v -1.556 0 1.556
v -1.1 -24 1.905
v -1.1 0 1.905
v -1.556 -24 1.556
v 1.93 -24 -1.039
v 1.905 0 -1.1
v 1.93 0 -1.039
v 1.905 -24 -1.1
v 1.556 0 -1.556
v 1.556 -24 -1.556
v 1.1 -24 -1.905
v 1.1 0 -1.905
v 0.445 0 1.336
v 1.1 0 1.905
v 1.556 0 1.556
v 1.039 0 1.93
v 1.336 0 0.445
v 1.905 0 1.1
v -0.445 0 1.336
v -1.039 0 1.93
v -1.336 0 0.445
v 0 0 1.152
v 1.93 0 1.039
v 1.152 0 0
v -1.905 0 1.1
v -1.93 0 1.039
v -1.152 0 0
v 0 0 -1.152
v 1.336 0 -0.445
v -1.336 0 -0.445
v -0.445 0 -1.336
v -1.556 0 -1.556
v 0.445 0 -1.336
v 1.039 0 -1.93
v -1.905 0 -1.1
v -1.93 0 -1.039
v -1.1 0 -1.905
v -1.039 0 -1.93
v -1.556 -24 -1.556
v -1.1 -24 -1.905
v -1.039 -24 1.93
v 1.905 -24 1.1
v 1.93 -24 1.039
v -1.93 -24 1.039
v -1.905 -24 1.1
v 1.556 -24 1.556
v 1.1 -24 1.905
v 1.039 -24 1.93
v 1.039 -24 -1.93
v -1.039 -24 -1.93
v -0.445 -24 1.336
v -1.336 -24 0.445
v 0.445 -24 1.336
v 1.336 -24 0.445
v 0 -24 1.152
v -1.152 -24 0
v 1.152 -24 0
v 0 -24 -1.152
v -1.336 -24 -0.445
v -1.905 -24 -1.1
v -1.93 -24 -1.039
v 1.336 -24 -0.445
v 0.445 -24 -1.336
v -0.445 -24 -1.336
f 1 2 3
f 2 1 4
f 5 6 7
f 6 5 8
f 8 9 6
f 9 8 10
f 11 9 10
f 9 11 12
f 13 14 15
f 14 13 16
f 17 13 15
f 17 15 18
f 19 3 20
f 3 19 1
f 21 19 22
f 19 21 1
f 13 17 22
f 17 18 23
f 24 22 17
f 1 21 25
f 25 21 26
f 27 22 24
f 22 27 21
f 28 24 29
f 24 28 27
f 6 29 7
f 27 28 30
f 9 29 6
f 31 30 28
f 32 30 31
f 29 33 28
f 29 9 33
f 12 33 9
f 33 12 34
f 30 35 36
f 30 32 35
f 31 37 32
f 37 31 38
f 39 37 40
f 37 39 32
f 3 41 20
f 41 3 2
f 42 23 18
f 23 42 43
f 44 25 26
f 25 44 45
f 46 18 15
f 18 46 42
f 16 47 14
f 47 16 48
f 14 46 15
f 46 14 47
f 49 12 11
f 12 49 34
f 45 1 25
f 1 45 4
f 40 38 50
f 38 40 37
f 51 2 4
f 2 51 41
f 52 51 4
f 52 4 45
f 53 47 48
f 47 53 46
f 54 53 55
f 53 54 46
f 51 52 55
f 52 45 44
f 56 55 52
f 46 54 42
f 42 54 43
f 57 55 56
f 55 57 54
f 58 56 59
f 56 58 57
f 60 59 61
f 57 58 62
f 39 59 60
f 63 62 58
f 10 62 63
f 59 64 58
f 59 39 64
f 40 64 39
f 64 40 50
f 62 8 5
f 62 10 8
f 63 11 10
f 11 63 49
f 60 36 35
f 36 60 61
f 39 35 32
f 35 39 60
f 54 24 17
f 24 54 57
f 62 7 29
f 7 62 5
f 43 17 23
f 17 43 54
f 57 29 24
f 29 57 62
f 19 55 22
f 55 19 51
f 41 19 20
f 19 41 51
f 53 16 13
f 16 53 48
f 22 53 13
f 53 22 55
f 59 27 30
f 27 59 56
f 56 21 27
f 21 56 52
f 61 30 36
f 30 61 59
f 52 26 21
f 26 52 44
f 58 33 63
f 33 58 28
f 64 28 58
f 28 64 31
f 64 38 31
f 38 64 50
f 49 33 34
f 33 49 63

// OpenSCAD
// file: PELA-technic-axle.scad
/*
PELA Parametric LEGO-compatible Technic Axle

PELA Parametric Blocks - 3D Printed LEGO-compatible parametric blocks

Published at https://PELAblocks.org

By Paul Houghton
Twitter: @mobile_rat
Email: paulirotta@gmail.com
Blog: https://medium.com/@paulhoughton

Creative Commons Attribution-ShareAlike 4.0 International License
    https://creativecommons.org/licenses/by-sa/4.0/legalcode

Open source design, Powered By Futurice. Come work with the best.
    https://www.futurice.com/
*/

include <../style.scad>
include <../material.scad>
use <../PELA-block.scad>


/* [Render] */

// Show the inside structure [mm]
_cut_line = 0; // [0:0.5:5]

// Printing material (set to select calibrated knob, socket and axle hole fit)
_material = 0; // [0:PLA, 1:ABS, 2:PET, 3:Biofila Silk, 4:Pro1, 5:NGEN, 6:NGEN FLEX, 7:Bridge Nylon, 8:TPU95, 9:TPU85/NinjaFlex, 10:Polycarbonite]

// Is the printer nozzle >= 0.5mm? If so, some features are enlarged to make printing easier
_large_nozzle = true;


/* [Technic Axle] */

// Axle length [blocks]
_l = 3; // [1:1:20]

// An axle which fits loosely in a technic bearing hole [mm]
_axle_radius = 2.2; // [0.2:0.1:3.9]

// Size of the hollow inside an axle [mm]
_center_radius = 1.1; // [0.0:0.1:3.8]


/* [Technic Axle] */
_defeather = 0.001;


///////////////////////////////
// DISPLAY
///////////////////////////////

axle(material=_material, large_nozzle=_large_nozzle, cut_line=_cut_line, l=_l, axle_radius=_axle_radius, center_radius=_center_radius);
  



/////////////////////////////////////
// MODULES
/////////////////////////////////////

module axle(material, large_nozzle, cut_line=_cut_line, l, axle_radius, center_radius) {
    
    assert(material!=undef);
    assert(large_nozzle!=undef);
    assert(cut_line!=undef);
    assert(l>=0);
    assert(axle_radius>=0);
    assert(center_radius>=0);

    axle_length = block_width(l);

    difference() {
        cylinder(r=axle_radius, h=axle_length);

        union() {
            translate([0, 0, -_defeather]) {
                if (center_radius > 0 && axle_length > 0)
                    cylinder(r=center_radius, h=axle_length + 2*_defeather);
            }

            translate([-axle_radius, -axle_radius, 0]) {
                cut_space(material=material, large_nozzle=large_nozzle, l=l, w=1, cut_line=cut_line, h=l, block_height=_block_height, knob_height=_knob_height, skin=0);
            }
        }
    }
}
// file: ../style.scad
/*
PELA Parametric Block Style

Alter the baseline style of all designs. Many designs will locally override some but not all of these parameters.

Published at https://PELAblocks.org

By Paul Houghton
Twitter: @mobile_rat
Email: paulirotta@gmail.com
Blog: https://medium.com/@paulhoughton

Creative Commons Attribution-ShareAlike 4.0 International License
    https://creativecommons.org/licenses/by-sa/4.0/legalcode

Open source design, Powered By Futurice. Come work with the best.
    https://www.futurice.com/

Import this into other design files to set baseline constants:
    include <style.scad>

If the nozzle you normally use on your printer is 0.5mm or less, edit line 31 to read:
    31:     large_nozzle = false; // [true:nozzle >= 0.5mm, false:nozzle < 0.5mm]

There are many other parameters here which affect all generated PELA models. Any changes you make here affect all models unless that parameter is locally updated in a given model. Where models duplicate these settings, the local value will appear in the "Customizer" view of OpenSCAD. Think of those local overrides of these default style settings as a design decision: changing that parameter for that particular model is likely to be useful to you.

*/

include <material.scad>


/* [Block] */

// Presence of bottom connector sockets
_sockets = true;

// Presence of top connector knobs
_knobs = true;

// Place holes in the corners for mountings screws (0=>no holes, 1=>holes)
_corner_bolt_holes = false;

// Size of corner holes for M3 mountings bolts
_bolt_hole_radius = 1.6; // [0.0:0.1:3.0]

// Add interior fill for the base layer
_solid_first_layer = false;

// Add interior fill for upper layers
_solid_upper_layers = true;


/* [Knob] */

// Knob top surface strength
_knob_top_thickness = 1.0;

// Height of traditional connectors [mm] (taller gives a stronger hold)
_knob_height = 2.9; // [0:disabled, 1.8:traditional, 2.9:PELA 3D print tall]

// Size of a hole in the top of each knob. Set 0 to disable for best flexture or enable for air circulation/aesthetics/drain resin
_knob_vent_radius = 0.0; // [0.0:0.1:4]

// Ease insertion by slightly widening the socket entry
_bevel_socket = true;

// Height of a small bottom knob insert easement, flaring the bottom edges to make assembly easier
_socket_insert_bevel = 0.1;




/* [Technic] */

// Technic connector hole
//axle_hole_radius = 2.45 + axle_hole_tweak;

// Add full width through holes spaced along the length for techic connectors
_side_holes = 3; // [0:disabled, 1:short air vents, 2:short connectors, 3:full width connectors]

// Add a wrapper around side holes (disable for extra ventilation but loose lock notches)
_side_sheaths = true;

// Add short end holes spaced along the width for techic connectors
_end_holes = 2; // [0:disabled, 1:short air vents, 2:short connectors, 3:full length connectors]

// Add a wrapper around end holes (disable for extra ventilation but loose lock notches)
_end_sheaths = true;

// Add holes in the top deck to improve airflow and reduce weight
_top_vents = false;


/* [Shell] */

// Thickness of the solid top surface of the block
_top_shell = 1;


/* [Advanced Block] */

// Basic unit vertical size of each block
_block_height = 8; // [8:technic, 9.6:traditional knobs]

// Horizontal clearance space removed from the outer horizontal surface to allow two parts to be placed next to one another on a 8mm grid [mm]
_skin = 0.1; // [0:0.02:0.5]

// Height of the hole beneath each knob which facilitates click lock in low-flex materials by variable side pressure on any block above
_knob_flexture_height = 4.5;

// Width of horizontal surface strengthening slats between the bottom rings
_bottom_stiffener_width = 2.6;

// Height of horizontal surface strengthening slats (appears between the bottom rings, default is material.scad:knob_height)
_bottom_stiffener_height = _knob_height;


/* [Advanced Technic] */

// Technic connector hole inset radius
_counterbore_inset_radius = 3.1; // [0.1:0.1:4]

// Technic connector hole inset depth
_counterbore_inset_depth = 0.95; // [0.1:0.1:4]

// Contact length of axle to block (not including inset length and end snap fit flexture in peg connectors)
_peg_length = 6.5; // [0.1:0.1:16]

// Size of the cylinder wrapped around the technic holes
_bearing_sheath_thickness = 0.9; // [0.1:0.1:4]


/* [Block Aesthetics] */

// Width of a line etched in the side of multi-layer block sets (0 to disable)
_ridge_width = 0.15; // [0.1:0.05:4]

// Depth of a line etched in the side of multi-layer block sets
_ridge_depth = 0.3; // [0.1:0.05:4]


/* [Baked Print Supports] */

// Generate print-time support aid structures for models which offer this. Turn this off if you will use slicer-generated print supports, but be aware that these may make the bottom connectors difficult to post process.
_print_supports = true;

// Space between support/support.scad and the part)
_support_offset_from_part = 0.1; // [0.0:0.01:1]

// Thickness of each rotating layer in a twisting support [mm]
_support_layer_height = 2; // [0.1:0.1:8]

// Thickness of a base panel for holding supports together [mm]
_support_connection_height = 0.5; // [0.1:0.1:8]

// Length of sides of a support equilateral triangle [mm]
_support_side_length = 4; // [0.1:0.1:16]

// Per layer support rotation for strength [degrees]
_support_layer_rotation = 6; // [1:179]

// Reverse direction of support rotation periodically to constrain size [degrees] (0 to disable)
_support_max_rotation = 0; // [0:360]


/* [Hidden] */

// Basic unit horizontal size of each block
_block_width = 8; // [8:technic and traditional blocks]

// Height of the connectors commercial blocks use [mm]
_official_knob_height = 1.8; // [1.8:traditional blocks]

// Slight visual offset to work around prevent goldfeather rendering bugs in OpenSCAD (visual, not affecting final print geometry) [mm]
_defeather = 0.01;

// Roundness of bottom connector rings (Use 8 for octagonal sockets- many parts of the geomoetry must be adjusted if you change this)
_ring_fn=8;

// Roundness of bottom connector rings (Use 8 for octagonal sockets- many parts of the geomoetry must be adjusted if you change this)
_axle_hole_fn=32;

// Minimum angle to approximate a circle
$fa = 15;

// Minimum segment length to approximate a circle
$fs = 0.5;


/////////////////////////////////////
// FUNCTIONS
/////////////////////////////////////

// Horizontal size
function block_width(i=1) = i*_block_width;

// Vertical size [mm]
function block_height(h=1, block_height) = h*block_height;

// Test if this is a corner block
function is_corner(x, y, l, w) = (x==0 || x==l-1) && (y==0 || y==w-1);

// Ratio of a flat panel thickness to a regular block thickness (1/2 for PELA 8mm tall blocks, 1/3 for LEGO 9.6mm block_height blocks)
function panel_height_ratio(block_height) = block_height < 9.6 ? 1/2 : 1/3;

// Thickness of a flat panel [mm]
function panel_height(block_height) = block_height(1, block_height=_block_height)*panel_height_ratio(block_height=_block_height);

// Bottom connector additional distance from outside lock and connector rings which small flexture-fit rims protrude inwards to grab the base of knobs for asymmetric side pressure to assist with snap fit [mm]
function side_lock_thickness(material) = is_flexible(_material) ? 0.06 : 0.02;

// Horizontal width of each side of a support triangle [mm]
function support_line_width(large_nozzle) = large_nozzle ? 0.7 : 0.5;

// Force the cut visual line for seeing inside parts to be between 0 and 1mm short of the part width [mm]
function visual_cut(cut_line, w) = max(min(cut_line, block_width(w)), 0);

// Thickness of the solid outside surface of the block [mm]
function side_shell(large_nozzle) = large_nozzle ? 1.2 : 1.0;
// main file
/*
Parametric PELA LEGO-compatible technic cross-shaped rotational drive Axle

PELA Parametric Blocks - 3D Printed LEGO-compatible parametric blocks

By Paul Houghton
Twitter: @mobile_rat
Email: paulirotta@gmail.com
Blog: https://medium.com/@paulhoughton

Creative Commons Attribution-ShareAlike 4.0 International License
    https://creativecommons.org/licenses/by-sa/4.0/legalcode

Open source design, Powered By Futurice. Come work with the best.
    https://www.futurice.com/
*/

include <../style.scad>
include <../material.scad>
use <../PELA-block.scad>
use <PELA-technic-axle.scad>


/* [Render] */

// Printing material (set to select calibrated knob, socket and axle hole fit)
_material = 0; // [0:PLA, 1:ABS, 2:PET, 3:Biofila Silk, 4:Pro1, 5:NGEN, 6:NGEN FLEX, 7:Bridge Nylon, 8:TPU95, 9:TPU85/NinjaFlex, 10:Polycarbonite]

// Is the printer nozzle >= 0.5mm? If so, some features are enlarged to make printing easier
_large_nozzle = true;


/* [Technic Cross Axle] */

// Axle length [blocks]
_l = 3; // [1:1:20]

// Outside radius of an axle which fits loosely in a technic bearing hole [mm]
_axle_radius = 2.2; // [0.1:1:20]

// Size of the axle solid center before rounding [mm]
_center_radius = 0.73; // [0.1:0.01:4]

// Cross axle inside rounding radius [mm]
_axle_rounding = 0.63; // [0.2:0.01:4.0]



///////////////////////////////
// DISPLAY
///////////////////////////////


cross_axle(material=_material, large_nozzle=_large_nozzle, l=_l, axle_rounding=_axle_rounding, axle_radius=_axle_radius, center_radius=_center_radius);
    




/////////////////////////////////////
// MODULES
/////////////////////////////////////

module cross_axle(material, large_nozzle, l, axle_rounding, axle_radius, center_radius) {

    assert(material!=undef);
    assert(large_nozzle!=undef);
    assert(l!=undef);
    assert(axle_rounding!=undef);
    assert(axle_radius!=undef);
    assert(center_radius!=undef);

    axle_length = block_width(l);

    rotate([90, 45, 0]) {
        difference() {
            axle(material=material, cut_line=0, large_nozzle=large_nozzle, l=l, axle_radius=axle_radius, center_radius=0);
            
            axle_cross_negative_space(material=material, large_nozzle=large_nozzle, axle_length=axle_length, axle_rounding=axle_rounding, axle_radius=axle_radius);
        }
    }
}


// That which is cut away four times from a solid to create a cross axle
module axle_cross_negative_space(material, large_nozzle, axle_length, axle_rounding, axle_radius) {
    
    assert(material!=undef);
    assert(large_nozzle!=undef);
    assert(axle_length!=undef);
    assert(axle_rounding!=undef);
    assert(axle_radius!=undef);

    for (rot=[0:90:270]) {
        rotate([0, 0, rot]) {
            hull() {
                translate([axle_rounding*2, axle_rounding*2, -_defeather]) {
                    cylinder(r=axle_rounding, h=axle_length+2*_defeather);

                    translate([axle_radius, 0, 0]) {
                        cylinder(r=axle_rounding, h=axle_length+2*_defeather);
                    }

                    translate([0, axle_radius, 0]) {
                        cylinder(r=axle_rounding, h=axle_length+2*_defeather);
                    }
                }
            }
        }
    }
}
